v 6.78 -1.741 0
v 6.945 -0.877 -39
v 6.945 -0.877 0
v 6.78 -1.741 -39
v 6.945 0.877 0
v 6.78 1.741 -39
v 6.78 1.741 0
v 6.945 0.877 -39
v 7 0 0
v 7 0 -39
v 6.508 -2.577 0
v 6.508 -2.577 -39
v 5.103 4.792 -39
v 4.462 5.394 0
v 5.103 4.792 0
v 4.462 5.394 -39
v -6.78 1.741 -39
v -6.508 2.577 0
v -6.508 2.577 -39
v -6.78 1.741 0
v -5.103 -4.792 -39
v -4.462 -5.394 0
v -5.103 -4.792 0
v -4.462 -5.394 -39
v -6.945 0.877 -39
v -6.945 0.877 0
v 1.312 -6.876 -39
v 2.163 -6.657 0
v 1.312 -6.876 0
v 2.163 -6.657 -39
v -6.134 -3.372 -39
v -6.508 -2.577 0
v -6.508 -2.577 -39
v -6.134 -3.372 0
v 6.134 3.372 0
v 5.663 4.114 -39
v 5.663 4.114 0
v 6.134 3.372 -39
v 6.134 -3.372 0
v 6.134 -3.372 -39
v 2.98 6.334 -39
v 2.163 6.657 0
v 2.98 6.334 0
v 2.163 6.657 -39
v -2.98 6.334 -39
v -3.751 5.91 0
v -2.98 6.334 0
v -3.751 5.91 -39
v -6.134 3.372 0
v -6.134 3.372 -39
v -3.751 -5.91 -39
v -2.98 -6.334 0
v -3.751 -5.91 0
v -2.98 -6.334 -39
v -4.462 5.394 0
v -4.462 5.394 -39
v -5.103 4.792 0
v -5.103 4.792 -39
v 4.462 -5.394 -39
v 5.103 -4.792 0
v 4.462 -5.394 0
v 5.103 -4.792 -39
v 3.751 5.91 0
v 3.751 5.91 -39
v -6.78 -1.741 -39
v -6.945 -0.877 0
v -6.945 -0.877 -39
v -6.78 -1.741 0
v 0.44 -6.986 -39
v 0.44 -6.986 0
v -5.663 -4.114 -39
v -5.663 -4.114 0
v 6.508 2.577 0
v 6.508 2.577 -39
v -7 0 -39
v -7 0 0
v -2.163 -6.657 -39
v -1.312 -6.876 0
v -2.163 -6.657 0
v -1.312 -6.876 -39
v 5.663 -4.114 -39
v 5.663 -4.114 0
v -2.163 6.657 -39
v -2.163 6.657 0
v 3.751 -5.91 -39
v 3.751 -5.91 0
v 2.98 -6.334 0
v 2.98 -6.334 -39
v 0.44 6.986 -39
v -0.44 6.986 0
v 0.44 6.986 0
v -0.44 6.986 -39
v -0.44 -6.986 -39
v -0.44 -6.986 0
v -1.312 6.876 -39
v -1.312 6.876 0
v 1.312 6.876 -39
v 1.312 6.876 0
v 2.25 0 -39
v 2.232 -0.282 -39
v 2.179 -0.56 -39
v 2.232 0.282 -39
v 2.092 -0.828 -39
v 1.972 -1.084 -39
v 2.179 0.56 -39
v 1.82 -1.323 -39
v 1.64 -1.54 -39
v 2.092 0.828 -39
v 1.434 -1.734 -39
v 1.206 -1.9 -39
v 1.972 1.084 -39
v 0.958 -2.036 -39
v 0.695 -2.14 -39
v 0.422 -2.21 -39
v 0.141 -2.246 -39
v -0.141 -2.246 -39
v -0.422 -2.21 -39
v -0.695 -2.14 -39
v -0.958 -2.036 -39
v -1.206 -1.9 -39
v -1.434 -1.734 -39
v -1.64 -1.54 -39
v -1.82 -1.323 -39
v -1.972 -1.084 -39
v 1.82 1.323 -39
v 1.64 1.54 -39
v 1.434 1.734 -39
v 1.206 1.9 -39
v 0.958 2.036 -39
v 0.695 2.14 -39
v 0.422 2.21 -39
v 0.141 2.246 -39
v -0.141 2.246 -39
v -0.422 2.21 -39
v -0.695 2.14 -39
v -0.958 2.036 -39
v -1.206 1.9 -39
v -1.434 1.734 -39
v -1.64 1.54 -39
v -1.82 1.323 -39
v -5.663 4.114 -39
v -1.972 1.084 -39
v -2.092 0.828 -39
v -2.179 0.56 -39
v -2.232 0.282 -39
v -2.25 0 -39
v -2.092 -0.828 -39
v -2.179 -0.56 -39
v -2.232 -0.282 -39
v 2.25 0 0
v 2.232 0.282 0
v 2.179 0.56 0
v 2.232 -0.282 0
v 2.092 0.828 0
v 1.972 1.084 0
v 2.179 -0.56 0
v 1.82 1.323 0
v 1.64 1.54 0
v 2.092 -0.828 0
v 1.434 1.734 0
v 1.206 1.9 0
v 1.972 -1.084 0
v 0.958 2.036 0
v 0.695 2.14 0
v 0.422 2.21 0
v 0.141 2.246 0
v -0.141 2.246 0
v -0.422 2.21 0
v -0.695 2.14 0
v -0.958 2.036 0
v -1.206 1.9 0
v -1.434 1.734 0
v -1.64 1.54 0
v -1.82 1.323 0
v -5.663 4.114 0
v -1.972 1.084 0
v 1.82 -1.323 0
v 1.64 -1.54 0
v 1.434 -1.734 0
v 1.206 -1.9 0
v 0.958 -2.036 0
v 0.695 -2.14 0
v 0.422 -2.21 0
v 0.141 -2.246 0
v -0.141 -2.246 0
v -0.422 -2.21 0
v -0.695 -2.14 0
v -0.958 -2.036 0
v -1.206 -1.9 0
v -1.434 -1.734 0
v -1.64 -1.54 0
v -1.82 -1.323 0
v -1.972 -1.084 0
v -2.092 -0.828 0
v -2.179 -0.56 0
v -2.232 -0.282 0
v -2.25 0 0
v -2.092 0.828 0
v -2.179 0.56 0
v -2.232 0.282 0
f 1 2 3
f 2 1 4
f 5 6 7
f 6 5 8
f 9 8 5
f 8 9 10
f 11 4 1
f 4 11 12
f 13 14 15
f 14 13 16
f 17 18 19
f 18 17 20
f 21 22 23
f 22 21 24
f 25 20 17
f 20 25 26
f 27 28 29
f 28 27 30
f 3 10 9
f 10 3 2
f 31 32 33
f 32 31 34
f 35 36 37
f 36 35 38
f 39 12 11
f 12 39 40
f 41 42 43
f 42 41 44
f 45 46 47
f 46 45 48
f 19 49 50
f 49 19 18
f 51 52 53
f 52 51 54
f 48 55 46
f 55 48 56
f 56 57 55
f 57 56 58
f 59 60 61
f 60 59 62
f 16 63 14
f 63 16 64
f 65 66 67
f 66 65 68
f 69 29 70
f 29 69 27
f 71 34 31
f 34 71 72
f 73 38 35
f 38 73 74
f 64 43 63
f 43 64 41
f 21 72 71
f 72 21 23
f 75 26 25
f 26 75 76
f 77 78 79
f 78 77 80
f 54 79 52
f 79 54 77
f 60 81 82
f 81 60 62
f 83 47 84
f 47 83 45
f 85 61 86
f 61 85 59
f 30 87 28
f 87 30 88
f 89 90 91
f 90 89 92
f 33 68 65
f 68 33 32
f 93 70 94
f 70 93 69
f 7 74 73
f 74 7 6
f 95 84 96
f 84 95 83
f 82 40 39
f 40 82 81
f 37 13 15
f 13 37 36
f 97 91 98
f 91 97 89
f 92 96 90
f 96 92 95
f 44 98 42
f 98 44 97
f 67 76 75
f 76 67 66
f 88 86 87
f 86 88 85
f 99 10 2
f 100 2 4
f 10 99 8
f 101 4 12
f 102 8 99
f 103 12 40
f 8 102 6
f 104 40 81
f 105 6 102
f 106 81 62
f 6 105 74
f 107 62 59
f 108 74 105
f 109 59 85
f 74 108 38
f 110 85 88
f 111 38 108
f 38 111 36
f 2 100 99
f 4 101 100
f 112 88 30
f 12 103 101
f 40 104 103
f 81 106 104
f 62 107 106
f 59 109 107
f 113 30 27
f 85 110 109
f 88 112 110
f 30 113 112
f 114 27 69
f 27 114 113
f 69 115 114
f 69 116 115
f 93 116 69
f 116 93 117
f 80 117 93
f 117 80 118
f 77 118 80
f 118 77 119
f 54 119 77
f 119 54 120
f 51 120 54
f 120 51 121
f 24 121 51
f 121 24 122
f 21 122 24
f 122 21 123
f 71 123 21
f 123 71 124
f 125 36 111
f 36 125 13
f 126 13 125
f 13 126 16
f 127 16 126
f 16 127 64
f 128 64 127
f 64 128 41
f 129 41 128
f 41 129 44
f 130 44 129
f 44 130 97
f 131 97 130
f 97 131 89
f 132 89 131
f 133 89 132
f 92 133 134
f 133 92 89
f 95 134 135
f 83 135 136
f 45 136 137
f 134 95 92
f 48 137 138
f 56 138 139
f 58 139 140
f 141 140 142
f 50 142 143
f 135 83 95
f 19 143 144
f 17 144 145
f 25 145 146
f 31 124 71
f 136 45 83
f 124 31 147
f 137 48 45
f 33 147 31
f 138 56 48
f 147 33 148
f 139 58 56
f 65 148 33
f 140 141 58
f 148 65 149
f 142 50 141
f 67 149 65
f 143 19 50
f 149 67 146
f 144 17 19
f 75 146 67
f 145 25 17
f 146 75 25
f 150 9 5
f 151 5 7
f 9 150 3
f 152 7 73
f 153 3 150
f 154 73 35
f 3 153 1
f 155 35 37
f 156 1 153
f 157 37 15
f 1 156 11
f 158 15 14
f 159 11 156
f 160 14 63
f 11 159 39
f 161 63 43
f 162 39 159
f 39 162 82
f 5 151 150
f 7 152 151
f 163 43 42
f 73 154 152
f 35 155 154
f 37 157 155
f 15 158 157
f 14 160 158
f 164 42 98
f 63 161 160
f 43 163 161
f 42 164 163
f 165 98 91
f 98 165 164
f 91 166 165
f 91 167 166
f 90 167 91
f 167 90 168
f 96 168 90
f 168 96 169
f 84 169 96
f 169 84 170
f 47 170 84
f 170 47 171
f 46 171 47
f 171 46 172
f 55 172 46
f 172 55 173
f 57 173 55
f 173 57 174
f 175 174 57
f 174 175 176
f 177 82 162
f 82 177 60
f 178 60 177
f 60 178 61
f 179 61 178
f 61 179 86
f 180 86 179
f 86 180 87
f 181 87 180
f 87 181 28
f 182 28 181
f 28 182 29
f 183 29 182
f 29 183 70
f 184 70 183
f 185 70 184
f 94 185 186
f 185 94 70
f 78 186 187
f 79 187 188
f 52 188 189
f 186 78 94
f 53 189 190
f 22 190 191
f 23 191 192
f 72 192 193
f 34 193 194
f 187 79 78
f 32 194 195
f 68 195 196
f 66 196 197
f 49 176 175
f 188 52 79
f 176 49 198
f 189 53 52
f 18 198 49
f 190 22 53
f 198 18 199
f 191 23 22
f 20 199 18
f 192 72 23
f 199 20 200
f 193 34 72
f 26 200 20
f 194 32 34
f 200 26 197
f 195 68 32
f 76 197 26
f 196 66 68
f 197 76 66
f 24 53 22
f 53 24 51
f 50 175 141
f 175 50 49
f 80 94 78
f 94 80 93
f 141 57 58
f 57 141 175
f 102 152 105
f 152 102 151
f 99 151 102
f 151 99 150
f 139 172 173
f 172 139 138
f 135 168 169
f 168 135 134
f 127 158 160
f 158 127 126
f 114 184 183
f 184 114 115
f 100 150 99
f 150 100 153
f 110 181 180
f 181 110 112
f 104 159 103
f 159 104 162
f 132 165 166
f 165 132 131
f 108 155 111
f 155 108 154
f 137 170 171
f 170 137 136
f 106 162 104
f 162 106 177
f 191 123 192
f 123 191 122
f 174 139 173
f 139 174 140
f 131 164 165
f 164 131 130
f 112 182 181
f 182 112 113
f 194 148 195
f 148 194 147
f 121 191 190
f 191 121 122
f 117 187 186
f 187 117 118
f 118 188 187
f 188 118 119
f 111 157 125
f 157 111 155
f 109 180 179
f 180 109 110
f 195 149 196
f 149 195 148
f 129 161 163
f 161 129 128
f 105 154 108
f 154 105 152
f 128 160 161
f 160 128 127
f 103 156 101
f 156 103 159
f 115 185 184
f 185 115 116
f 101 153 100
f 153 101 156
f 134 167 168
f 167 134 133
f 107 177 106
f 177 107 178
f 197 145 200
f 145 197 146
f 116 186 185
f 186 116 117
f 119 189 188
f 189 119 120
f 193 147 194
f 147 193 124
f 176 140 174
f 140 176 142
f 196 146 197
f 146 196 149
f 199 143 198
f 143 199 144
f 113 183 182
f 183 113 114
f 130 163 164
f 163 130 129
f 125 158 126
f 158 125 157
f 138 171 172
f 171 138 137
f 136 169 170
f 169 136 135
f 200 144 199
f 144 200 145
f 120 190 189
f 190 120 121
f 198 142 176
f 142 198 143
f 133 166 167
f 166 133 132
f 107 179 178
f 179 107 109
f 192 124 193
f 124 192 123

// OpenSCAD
$fn = 50;


difference() {
	union() {
		translate(v = [0, 0, -39.0000000000]) {
			cylinder(h = 39, r = 7.0000000000);
		}
		cylinder(h = 0, r = 13.0000000000);
	}
	union() {
		#translate(v = [0, 0, -39]) {
			cylinder(h = 39, r = 2.2500000000);
		}
	}
}
